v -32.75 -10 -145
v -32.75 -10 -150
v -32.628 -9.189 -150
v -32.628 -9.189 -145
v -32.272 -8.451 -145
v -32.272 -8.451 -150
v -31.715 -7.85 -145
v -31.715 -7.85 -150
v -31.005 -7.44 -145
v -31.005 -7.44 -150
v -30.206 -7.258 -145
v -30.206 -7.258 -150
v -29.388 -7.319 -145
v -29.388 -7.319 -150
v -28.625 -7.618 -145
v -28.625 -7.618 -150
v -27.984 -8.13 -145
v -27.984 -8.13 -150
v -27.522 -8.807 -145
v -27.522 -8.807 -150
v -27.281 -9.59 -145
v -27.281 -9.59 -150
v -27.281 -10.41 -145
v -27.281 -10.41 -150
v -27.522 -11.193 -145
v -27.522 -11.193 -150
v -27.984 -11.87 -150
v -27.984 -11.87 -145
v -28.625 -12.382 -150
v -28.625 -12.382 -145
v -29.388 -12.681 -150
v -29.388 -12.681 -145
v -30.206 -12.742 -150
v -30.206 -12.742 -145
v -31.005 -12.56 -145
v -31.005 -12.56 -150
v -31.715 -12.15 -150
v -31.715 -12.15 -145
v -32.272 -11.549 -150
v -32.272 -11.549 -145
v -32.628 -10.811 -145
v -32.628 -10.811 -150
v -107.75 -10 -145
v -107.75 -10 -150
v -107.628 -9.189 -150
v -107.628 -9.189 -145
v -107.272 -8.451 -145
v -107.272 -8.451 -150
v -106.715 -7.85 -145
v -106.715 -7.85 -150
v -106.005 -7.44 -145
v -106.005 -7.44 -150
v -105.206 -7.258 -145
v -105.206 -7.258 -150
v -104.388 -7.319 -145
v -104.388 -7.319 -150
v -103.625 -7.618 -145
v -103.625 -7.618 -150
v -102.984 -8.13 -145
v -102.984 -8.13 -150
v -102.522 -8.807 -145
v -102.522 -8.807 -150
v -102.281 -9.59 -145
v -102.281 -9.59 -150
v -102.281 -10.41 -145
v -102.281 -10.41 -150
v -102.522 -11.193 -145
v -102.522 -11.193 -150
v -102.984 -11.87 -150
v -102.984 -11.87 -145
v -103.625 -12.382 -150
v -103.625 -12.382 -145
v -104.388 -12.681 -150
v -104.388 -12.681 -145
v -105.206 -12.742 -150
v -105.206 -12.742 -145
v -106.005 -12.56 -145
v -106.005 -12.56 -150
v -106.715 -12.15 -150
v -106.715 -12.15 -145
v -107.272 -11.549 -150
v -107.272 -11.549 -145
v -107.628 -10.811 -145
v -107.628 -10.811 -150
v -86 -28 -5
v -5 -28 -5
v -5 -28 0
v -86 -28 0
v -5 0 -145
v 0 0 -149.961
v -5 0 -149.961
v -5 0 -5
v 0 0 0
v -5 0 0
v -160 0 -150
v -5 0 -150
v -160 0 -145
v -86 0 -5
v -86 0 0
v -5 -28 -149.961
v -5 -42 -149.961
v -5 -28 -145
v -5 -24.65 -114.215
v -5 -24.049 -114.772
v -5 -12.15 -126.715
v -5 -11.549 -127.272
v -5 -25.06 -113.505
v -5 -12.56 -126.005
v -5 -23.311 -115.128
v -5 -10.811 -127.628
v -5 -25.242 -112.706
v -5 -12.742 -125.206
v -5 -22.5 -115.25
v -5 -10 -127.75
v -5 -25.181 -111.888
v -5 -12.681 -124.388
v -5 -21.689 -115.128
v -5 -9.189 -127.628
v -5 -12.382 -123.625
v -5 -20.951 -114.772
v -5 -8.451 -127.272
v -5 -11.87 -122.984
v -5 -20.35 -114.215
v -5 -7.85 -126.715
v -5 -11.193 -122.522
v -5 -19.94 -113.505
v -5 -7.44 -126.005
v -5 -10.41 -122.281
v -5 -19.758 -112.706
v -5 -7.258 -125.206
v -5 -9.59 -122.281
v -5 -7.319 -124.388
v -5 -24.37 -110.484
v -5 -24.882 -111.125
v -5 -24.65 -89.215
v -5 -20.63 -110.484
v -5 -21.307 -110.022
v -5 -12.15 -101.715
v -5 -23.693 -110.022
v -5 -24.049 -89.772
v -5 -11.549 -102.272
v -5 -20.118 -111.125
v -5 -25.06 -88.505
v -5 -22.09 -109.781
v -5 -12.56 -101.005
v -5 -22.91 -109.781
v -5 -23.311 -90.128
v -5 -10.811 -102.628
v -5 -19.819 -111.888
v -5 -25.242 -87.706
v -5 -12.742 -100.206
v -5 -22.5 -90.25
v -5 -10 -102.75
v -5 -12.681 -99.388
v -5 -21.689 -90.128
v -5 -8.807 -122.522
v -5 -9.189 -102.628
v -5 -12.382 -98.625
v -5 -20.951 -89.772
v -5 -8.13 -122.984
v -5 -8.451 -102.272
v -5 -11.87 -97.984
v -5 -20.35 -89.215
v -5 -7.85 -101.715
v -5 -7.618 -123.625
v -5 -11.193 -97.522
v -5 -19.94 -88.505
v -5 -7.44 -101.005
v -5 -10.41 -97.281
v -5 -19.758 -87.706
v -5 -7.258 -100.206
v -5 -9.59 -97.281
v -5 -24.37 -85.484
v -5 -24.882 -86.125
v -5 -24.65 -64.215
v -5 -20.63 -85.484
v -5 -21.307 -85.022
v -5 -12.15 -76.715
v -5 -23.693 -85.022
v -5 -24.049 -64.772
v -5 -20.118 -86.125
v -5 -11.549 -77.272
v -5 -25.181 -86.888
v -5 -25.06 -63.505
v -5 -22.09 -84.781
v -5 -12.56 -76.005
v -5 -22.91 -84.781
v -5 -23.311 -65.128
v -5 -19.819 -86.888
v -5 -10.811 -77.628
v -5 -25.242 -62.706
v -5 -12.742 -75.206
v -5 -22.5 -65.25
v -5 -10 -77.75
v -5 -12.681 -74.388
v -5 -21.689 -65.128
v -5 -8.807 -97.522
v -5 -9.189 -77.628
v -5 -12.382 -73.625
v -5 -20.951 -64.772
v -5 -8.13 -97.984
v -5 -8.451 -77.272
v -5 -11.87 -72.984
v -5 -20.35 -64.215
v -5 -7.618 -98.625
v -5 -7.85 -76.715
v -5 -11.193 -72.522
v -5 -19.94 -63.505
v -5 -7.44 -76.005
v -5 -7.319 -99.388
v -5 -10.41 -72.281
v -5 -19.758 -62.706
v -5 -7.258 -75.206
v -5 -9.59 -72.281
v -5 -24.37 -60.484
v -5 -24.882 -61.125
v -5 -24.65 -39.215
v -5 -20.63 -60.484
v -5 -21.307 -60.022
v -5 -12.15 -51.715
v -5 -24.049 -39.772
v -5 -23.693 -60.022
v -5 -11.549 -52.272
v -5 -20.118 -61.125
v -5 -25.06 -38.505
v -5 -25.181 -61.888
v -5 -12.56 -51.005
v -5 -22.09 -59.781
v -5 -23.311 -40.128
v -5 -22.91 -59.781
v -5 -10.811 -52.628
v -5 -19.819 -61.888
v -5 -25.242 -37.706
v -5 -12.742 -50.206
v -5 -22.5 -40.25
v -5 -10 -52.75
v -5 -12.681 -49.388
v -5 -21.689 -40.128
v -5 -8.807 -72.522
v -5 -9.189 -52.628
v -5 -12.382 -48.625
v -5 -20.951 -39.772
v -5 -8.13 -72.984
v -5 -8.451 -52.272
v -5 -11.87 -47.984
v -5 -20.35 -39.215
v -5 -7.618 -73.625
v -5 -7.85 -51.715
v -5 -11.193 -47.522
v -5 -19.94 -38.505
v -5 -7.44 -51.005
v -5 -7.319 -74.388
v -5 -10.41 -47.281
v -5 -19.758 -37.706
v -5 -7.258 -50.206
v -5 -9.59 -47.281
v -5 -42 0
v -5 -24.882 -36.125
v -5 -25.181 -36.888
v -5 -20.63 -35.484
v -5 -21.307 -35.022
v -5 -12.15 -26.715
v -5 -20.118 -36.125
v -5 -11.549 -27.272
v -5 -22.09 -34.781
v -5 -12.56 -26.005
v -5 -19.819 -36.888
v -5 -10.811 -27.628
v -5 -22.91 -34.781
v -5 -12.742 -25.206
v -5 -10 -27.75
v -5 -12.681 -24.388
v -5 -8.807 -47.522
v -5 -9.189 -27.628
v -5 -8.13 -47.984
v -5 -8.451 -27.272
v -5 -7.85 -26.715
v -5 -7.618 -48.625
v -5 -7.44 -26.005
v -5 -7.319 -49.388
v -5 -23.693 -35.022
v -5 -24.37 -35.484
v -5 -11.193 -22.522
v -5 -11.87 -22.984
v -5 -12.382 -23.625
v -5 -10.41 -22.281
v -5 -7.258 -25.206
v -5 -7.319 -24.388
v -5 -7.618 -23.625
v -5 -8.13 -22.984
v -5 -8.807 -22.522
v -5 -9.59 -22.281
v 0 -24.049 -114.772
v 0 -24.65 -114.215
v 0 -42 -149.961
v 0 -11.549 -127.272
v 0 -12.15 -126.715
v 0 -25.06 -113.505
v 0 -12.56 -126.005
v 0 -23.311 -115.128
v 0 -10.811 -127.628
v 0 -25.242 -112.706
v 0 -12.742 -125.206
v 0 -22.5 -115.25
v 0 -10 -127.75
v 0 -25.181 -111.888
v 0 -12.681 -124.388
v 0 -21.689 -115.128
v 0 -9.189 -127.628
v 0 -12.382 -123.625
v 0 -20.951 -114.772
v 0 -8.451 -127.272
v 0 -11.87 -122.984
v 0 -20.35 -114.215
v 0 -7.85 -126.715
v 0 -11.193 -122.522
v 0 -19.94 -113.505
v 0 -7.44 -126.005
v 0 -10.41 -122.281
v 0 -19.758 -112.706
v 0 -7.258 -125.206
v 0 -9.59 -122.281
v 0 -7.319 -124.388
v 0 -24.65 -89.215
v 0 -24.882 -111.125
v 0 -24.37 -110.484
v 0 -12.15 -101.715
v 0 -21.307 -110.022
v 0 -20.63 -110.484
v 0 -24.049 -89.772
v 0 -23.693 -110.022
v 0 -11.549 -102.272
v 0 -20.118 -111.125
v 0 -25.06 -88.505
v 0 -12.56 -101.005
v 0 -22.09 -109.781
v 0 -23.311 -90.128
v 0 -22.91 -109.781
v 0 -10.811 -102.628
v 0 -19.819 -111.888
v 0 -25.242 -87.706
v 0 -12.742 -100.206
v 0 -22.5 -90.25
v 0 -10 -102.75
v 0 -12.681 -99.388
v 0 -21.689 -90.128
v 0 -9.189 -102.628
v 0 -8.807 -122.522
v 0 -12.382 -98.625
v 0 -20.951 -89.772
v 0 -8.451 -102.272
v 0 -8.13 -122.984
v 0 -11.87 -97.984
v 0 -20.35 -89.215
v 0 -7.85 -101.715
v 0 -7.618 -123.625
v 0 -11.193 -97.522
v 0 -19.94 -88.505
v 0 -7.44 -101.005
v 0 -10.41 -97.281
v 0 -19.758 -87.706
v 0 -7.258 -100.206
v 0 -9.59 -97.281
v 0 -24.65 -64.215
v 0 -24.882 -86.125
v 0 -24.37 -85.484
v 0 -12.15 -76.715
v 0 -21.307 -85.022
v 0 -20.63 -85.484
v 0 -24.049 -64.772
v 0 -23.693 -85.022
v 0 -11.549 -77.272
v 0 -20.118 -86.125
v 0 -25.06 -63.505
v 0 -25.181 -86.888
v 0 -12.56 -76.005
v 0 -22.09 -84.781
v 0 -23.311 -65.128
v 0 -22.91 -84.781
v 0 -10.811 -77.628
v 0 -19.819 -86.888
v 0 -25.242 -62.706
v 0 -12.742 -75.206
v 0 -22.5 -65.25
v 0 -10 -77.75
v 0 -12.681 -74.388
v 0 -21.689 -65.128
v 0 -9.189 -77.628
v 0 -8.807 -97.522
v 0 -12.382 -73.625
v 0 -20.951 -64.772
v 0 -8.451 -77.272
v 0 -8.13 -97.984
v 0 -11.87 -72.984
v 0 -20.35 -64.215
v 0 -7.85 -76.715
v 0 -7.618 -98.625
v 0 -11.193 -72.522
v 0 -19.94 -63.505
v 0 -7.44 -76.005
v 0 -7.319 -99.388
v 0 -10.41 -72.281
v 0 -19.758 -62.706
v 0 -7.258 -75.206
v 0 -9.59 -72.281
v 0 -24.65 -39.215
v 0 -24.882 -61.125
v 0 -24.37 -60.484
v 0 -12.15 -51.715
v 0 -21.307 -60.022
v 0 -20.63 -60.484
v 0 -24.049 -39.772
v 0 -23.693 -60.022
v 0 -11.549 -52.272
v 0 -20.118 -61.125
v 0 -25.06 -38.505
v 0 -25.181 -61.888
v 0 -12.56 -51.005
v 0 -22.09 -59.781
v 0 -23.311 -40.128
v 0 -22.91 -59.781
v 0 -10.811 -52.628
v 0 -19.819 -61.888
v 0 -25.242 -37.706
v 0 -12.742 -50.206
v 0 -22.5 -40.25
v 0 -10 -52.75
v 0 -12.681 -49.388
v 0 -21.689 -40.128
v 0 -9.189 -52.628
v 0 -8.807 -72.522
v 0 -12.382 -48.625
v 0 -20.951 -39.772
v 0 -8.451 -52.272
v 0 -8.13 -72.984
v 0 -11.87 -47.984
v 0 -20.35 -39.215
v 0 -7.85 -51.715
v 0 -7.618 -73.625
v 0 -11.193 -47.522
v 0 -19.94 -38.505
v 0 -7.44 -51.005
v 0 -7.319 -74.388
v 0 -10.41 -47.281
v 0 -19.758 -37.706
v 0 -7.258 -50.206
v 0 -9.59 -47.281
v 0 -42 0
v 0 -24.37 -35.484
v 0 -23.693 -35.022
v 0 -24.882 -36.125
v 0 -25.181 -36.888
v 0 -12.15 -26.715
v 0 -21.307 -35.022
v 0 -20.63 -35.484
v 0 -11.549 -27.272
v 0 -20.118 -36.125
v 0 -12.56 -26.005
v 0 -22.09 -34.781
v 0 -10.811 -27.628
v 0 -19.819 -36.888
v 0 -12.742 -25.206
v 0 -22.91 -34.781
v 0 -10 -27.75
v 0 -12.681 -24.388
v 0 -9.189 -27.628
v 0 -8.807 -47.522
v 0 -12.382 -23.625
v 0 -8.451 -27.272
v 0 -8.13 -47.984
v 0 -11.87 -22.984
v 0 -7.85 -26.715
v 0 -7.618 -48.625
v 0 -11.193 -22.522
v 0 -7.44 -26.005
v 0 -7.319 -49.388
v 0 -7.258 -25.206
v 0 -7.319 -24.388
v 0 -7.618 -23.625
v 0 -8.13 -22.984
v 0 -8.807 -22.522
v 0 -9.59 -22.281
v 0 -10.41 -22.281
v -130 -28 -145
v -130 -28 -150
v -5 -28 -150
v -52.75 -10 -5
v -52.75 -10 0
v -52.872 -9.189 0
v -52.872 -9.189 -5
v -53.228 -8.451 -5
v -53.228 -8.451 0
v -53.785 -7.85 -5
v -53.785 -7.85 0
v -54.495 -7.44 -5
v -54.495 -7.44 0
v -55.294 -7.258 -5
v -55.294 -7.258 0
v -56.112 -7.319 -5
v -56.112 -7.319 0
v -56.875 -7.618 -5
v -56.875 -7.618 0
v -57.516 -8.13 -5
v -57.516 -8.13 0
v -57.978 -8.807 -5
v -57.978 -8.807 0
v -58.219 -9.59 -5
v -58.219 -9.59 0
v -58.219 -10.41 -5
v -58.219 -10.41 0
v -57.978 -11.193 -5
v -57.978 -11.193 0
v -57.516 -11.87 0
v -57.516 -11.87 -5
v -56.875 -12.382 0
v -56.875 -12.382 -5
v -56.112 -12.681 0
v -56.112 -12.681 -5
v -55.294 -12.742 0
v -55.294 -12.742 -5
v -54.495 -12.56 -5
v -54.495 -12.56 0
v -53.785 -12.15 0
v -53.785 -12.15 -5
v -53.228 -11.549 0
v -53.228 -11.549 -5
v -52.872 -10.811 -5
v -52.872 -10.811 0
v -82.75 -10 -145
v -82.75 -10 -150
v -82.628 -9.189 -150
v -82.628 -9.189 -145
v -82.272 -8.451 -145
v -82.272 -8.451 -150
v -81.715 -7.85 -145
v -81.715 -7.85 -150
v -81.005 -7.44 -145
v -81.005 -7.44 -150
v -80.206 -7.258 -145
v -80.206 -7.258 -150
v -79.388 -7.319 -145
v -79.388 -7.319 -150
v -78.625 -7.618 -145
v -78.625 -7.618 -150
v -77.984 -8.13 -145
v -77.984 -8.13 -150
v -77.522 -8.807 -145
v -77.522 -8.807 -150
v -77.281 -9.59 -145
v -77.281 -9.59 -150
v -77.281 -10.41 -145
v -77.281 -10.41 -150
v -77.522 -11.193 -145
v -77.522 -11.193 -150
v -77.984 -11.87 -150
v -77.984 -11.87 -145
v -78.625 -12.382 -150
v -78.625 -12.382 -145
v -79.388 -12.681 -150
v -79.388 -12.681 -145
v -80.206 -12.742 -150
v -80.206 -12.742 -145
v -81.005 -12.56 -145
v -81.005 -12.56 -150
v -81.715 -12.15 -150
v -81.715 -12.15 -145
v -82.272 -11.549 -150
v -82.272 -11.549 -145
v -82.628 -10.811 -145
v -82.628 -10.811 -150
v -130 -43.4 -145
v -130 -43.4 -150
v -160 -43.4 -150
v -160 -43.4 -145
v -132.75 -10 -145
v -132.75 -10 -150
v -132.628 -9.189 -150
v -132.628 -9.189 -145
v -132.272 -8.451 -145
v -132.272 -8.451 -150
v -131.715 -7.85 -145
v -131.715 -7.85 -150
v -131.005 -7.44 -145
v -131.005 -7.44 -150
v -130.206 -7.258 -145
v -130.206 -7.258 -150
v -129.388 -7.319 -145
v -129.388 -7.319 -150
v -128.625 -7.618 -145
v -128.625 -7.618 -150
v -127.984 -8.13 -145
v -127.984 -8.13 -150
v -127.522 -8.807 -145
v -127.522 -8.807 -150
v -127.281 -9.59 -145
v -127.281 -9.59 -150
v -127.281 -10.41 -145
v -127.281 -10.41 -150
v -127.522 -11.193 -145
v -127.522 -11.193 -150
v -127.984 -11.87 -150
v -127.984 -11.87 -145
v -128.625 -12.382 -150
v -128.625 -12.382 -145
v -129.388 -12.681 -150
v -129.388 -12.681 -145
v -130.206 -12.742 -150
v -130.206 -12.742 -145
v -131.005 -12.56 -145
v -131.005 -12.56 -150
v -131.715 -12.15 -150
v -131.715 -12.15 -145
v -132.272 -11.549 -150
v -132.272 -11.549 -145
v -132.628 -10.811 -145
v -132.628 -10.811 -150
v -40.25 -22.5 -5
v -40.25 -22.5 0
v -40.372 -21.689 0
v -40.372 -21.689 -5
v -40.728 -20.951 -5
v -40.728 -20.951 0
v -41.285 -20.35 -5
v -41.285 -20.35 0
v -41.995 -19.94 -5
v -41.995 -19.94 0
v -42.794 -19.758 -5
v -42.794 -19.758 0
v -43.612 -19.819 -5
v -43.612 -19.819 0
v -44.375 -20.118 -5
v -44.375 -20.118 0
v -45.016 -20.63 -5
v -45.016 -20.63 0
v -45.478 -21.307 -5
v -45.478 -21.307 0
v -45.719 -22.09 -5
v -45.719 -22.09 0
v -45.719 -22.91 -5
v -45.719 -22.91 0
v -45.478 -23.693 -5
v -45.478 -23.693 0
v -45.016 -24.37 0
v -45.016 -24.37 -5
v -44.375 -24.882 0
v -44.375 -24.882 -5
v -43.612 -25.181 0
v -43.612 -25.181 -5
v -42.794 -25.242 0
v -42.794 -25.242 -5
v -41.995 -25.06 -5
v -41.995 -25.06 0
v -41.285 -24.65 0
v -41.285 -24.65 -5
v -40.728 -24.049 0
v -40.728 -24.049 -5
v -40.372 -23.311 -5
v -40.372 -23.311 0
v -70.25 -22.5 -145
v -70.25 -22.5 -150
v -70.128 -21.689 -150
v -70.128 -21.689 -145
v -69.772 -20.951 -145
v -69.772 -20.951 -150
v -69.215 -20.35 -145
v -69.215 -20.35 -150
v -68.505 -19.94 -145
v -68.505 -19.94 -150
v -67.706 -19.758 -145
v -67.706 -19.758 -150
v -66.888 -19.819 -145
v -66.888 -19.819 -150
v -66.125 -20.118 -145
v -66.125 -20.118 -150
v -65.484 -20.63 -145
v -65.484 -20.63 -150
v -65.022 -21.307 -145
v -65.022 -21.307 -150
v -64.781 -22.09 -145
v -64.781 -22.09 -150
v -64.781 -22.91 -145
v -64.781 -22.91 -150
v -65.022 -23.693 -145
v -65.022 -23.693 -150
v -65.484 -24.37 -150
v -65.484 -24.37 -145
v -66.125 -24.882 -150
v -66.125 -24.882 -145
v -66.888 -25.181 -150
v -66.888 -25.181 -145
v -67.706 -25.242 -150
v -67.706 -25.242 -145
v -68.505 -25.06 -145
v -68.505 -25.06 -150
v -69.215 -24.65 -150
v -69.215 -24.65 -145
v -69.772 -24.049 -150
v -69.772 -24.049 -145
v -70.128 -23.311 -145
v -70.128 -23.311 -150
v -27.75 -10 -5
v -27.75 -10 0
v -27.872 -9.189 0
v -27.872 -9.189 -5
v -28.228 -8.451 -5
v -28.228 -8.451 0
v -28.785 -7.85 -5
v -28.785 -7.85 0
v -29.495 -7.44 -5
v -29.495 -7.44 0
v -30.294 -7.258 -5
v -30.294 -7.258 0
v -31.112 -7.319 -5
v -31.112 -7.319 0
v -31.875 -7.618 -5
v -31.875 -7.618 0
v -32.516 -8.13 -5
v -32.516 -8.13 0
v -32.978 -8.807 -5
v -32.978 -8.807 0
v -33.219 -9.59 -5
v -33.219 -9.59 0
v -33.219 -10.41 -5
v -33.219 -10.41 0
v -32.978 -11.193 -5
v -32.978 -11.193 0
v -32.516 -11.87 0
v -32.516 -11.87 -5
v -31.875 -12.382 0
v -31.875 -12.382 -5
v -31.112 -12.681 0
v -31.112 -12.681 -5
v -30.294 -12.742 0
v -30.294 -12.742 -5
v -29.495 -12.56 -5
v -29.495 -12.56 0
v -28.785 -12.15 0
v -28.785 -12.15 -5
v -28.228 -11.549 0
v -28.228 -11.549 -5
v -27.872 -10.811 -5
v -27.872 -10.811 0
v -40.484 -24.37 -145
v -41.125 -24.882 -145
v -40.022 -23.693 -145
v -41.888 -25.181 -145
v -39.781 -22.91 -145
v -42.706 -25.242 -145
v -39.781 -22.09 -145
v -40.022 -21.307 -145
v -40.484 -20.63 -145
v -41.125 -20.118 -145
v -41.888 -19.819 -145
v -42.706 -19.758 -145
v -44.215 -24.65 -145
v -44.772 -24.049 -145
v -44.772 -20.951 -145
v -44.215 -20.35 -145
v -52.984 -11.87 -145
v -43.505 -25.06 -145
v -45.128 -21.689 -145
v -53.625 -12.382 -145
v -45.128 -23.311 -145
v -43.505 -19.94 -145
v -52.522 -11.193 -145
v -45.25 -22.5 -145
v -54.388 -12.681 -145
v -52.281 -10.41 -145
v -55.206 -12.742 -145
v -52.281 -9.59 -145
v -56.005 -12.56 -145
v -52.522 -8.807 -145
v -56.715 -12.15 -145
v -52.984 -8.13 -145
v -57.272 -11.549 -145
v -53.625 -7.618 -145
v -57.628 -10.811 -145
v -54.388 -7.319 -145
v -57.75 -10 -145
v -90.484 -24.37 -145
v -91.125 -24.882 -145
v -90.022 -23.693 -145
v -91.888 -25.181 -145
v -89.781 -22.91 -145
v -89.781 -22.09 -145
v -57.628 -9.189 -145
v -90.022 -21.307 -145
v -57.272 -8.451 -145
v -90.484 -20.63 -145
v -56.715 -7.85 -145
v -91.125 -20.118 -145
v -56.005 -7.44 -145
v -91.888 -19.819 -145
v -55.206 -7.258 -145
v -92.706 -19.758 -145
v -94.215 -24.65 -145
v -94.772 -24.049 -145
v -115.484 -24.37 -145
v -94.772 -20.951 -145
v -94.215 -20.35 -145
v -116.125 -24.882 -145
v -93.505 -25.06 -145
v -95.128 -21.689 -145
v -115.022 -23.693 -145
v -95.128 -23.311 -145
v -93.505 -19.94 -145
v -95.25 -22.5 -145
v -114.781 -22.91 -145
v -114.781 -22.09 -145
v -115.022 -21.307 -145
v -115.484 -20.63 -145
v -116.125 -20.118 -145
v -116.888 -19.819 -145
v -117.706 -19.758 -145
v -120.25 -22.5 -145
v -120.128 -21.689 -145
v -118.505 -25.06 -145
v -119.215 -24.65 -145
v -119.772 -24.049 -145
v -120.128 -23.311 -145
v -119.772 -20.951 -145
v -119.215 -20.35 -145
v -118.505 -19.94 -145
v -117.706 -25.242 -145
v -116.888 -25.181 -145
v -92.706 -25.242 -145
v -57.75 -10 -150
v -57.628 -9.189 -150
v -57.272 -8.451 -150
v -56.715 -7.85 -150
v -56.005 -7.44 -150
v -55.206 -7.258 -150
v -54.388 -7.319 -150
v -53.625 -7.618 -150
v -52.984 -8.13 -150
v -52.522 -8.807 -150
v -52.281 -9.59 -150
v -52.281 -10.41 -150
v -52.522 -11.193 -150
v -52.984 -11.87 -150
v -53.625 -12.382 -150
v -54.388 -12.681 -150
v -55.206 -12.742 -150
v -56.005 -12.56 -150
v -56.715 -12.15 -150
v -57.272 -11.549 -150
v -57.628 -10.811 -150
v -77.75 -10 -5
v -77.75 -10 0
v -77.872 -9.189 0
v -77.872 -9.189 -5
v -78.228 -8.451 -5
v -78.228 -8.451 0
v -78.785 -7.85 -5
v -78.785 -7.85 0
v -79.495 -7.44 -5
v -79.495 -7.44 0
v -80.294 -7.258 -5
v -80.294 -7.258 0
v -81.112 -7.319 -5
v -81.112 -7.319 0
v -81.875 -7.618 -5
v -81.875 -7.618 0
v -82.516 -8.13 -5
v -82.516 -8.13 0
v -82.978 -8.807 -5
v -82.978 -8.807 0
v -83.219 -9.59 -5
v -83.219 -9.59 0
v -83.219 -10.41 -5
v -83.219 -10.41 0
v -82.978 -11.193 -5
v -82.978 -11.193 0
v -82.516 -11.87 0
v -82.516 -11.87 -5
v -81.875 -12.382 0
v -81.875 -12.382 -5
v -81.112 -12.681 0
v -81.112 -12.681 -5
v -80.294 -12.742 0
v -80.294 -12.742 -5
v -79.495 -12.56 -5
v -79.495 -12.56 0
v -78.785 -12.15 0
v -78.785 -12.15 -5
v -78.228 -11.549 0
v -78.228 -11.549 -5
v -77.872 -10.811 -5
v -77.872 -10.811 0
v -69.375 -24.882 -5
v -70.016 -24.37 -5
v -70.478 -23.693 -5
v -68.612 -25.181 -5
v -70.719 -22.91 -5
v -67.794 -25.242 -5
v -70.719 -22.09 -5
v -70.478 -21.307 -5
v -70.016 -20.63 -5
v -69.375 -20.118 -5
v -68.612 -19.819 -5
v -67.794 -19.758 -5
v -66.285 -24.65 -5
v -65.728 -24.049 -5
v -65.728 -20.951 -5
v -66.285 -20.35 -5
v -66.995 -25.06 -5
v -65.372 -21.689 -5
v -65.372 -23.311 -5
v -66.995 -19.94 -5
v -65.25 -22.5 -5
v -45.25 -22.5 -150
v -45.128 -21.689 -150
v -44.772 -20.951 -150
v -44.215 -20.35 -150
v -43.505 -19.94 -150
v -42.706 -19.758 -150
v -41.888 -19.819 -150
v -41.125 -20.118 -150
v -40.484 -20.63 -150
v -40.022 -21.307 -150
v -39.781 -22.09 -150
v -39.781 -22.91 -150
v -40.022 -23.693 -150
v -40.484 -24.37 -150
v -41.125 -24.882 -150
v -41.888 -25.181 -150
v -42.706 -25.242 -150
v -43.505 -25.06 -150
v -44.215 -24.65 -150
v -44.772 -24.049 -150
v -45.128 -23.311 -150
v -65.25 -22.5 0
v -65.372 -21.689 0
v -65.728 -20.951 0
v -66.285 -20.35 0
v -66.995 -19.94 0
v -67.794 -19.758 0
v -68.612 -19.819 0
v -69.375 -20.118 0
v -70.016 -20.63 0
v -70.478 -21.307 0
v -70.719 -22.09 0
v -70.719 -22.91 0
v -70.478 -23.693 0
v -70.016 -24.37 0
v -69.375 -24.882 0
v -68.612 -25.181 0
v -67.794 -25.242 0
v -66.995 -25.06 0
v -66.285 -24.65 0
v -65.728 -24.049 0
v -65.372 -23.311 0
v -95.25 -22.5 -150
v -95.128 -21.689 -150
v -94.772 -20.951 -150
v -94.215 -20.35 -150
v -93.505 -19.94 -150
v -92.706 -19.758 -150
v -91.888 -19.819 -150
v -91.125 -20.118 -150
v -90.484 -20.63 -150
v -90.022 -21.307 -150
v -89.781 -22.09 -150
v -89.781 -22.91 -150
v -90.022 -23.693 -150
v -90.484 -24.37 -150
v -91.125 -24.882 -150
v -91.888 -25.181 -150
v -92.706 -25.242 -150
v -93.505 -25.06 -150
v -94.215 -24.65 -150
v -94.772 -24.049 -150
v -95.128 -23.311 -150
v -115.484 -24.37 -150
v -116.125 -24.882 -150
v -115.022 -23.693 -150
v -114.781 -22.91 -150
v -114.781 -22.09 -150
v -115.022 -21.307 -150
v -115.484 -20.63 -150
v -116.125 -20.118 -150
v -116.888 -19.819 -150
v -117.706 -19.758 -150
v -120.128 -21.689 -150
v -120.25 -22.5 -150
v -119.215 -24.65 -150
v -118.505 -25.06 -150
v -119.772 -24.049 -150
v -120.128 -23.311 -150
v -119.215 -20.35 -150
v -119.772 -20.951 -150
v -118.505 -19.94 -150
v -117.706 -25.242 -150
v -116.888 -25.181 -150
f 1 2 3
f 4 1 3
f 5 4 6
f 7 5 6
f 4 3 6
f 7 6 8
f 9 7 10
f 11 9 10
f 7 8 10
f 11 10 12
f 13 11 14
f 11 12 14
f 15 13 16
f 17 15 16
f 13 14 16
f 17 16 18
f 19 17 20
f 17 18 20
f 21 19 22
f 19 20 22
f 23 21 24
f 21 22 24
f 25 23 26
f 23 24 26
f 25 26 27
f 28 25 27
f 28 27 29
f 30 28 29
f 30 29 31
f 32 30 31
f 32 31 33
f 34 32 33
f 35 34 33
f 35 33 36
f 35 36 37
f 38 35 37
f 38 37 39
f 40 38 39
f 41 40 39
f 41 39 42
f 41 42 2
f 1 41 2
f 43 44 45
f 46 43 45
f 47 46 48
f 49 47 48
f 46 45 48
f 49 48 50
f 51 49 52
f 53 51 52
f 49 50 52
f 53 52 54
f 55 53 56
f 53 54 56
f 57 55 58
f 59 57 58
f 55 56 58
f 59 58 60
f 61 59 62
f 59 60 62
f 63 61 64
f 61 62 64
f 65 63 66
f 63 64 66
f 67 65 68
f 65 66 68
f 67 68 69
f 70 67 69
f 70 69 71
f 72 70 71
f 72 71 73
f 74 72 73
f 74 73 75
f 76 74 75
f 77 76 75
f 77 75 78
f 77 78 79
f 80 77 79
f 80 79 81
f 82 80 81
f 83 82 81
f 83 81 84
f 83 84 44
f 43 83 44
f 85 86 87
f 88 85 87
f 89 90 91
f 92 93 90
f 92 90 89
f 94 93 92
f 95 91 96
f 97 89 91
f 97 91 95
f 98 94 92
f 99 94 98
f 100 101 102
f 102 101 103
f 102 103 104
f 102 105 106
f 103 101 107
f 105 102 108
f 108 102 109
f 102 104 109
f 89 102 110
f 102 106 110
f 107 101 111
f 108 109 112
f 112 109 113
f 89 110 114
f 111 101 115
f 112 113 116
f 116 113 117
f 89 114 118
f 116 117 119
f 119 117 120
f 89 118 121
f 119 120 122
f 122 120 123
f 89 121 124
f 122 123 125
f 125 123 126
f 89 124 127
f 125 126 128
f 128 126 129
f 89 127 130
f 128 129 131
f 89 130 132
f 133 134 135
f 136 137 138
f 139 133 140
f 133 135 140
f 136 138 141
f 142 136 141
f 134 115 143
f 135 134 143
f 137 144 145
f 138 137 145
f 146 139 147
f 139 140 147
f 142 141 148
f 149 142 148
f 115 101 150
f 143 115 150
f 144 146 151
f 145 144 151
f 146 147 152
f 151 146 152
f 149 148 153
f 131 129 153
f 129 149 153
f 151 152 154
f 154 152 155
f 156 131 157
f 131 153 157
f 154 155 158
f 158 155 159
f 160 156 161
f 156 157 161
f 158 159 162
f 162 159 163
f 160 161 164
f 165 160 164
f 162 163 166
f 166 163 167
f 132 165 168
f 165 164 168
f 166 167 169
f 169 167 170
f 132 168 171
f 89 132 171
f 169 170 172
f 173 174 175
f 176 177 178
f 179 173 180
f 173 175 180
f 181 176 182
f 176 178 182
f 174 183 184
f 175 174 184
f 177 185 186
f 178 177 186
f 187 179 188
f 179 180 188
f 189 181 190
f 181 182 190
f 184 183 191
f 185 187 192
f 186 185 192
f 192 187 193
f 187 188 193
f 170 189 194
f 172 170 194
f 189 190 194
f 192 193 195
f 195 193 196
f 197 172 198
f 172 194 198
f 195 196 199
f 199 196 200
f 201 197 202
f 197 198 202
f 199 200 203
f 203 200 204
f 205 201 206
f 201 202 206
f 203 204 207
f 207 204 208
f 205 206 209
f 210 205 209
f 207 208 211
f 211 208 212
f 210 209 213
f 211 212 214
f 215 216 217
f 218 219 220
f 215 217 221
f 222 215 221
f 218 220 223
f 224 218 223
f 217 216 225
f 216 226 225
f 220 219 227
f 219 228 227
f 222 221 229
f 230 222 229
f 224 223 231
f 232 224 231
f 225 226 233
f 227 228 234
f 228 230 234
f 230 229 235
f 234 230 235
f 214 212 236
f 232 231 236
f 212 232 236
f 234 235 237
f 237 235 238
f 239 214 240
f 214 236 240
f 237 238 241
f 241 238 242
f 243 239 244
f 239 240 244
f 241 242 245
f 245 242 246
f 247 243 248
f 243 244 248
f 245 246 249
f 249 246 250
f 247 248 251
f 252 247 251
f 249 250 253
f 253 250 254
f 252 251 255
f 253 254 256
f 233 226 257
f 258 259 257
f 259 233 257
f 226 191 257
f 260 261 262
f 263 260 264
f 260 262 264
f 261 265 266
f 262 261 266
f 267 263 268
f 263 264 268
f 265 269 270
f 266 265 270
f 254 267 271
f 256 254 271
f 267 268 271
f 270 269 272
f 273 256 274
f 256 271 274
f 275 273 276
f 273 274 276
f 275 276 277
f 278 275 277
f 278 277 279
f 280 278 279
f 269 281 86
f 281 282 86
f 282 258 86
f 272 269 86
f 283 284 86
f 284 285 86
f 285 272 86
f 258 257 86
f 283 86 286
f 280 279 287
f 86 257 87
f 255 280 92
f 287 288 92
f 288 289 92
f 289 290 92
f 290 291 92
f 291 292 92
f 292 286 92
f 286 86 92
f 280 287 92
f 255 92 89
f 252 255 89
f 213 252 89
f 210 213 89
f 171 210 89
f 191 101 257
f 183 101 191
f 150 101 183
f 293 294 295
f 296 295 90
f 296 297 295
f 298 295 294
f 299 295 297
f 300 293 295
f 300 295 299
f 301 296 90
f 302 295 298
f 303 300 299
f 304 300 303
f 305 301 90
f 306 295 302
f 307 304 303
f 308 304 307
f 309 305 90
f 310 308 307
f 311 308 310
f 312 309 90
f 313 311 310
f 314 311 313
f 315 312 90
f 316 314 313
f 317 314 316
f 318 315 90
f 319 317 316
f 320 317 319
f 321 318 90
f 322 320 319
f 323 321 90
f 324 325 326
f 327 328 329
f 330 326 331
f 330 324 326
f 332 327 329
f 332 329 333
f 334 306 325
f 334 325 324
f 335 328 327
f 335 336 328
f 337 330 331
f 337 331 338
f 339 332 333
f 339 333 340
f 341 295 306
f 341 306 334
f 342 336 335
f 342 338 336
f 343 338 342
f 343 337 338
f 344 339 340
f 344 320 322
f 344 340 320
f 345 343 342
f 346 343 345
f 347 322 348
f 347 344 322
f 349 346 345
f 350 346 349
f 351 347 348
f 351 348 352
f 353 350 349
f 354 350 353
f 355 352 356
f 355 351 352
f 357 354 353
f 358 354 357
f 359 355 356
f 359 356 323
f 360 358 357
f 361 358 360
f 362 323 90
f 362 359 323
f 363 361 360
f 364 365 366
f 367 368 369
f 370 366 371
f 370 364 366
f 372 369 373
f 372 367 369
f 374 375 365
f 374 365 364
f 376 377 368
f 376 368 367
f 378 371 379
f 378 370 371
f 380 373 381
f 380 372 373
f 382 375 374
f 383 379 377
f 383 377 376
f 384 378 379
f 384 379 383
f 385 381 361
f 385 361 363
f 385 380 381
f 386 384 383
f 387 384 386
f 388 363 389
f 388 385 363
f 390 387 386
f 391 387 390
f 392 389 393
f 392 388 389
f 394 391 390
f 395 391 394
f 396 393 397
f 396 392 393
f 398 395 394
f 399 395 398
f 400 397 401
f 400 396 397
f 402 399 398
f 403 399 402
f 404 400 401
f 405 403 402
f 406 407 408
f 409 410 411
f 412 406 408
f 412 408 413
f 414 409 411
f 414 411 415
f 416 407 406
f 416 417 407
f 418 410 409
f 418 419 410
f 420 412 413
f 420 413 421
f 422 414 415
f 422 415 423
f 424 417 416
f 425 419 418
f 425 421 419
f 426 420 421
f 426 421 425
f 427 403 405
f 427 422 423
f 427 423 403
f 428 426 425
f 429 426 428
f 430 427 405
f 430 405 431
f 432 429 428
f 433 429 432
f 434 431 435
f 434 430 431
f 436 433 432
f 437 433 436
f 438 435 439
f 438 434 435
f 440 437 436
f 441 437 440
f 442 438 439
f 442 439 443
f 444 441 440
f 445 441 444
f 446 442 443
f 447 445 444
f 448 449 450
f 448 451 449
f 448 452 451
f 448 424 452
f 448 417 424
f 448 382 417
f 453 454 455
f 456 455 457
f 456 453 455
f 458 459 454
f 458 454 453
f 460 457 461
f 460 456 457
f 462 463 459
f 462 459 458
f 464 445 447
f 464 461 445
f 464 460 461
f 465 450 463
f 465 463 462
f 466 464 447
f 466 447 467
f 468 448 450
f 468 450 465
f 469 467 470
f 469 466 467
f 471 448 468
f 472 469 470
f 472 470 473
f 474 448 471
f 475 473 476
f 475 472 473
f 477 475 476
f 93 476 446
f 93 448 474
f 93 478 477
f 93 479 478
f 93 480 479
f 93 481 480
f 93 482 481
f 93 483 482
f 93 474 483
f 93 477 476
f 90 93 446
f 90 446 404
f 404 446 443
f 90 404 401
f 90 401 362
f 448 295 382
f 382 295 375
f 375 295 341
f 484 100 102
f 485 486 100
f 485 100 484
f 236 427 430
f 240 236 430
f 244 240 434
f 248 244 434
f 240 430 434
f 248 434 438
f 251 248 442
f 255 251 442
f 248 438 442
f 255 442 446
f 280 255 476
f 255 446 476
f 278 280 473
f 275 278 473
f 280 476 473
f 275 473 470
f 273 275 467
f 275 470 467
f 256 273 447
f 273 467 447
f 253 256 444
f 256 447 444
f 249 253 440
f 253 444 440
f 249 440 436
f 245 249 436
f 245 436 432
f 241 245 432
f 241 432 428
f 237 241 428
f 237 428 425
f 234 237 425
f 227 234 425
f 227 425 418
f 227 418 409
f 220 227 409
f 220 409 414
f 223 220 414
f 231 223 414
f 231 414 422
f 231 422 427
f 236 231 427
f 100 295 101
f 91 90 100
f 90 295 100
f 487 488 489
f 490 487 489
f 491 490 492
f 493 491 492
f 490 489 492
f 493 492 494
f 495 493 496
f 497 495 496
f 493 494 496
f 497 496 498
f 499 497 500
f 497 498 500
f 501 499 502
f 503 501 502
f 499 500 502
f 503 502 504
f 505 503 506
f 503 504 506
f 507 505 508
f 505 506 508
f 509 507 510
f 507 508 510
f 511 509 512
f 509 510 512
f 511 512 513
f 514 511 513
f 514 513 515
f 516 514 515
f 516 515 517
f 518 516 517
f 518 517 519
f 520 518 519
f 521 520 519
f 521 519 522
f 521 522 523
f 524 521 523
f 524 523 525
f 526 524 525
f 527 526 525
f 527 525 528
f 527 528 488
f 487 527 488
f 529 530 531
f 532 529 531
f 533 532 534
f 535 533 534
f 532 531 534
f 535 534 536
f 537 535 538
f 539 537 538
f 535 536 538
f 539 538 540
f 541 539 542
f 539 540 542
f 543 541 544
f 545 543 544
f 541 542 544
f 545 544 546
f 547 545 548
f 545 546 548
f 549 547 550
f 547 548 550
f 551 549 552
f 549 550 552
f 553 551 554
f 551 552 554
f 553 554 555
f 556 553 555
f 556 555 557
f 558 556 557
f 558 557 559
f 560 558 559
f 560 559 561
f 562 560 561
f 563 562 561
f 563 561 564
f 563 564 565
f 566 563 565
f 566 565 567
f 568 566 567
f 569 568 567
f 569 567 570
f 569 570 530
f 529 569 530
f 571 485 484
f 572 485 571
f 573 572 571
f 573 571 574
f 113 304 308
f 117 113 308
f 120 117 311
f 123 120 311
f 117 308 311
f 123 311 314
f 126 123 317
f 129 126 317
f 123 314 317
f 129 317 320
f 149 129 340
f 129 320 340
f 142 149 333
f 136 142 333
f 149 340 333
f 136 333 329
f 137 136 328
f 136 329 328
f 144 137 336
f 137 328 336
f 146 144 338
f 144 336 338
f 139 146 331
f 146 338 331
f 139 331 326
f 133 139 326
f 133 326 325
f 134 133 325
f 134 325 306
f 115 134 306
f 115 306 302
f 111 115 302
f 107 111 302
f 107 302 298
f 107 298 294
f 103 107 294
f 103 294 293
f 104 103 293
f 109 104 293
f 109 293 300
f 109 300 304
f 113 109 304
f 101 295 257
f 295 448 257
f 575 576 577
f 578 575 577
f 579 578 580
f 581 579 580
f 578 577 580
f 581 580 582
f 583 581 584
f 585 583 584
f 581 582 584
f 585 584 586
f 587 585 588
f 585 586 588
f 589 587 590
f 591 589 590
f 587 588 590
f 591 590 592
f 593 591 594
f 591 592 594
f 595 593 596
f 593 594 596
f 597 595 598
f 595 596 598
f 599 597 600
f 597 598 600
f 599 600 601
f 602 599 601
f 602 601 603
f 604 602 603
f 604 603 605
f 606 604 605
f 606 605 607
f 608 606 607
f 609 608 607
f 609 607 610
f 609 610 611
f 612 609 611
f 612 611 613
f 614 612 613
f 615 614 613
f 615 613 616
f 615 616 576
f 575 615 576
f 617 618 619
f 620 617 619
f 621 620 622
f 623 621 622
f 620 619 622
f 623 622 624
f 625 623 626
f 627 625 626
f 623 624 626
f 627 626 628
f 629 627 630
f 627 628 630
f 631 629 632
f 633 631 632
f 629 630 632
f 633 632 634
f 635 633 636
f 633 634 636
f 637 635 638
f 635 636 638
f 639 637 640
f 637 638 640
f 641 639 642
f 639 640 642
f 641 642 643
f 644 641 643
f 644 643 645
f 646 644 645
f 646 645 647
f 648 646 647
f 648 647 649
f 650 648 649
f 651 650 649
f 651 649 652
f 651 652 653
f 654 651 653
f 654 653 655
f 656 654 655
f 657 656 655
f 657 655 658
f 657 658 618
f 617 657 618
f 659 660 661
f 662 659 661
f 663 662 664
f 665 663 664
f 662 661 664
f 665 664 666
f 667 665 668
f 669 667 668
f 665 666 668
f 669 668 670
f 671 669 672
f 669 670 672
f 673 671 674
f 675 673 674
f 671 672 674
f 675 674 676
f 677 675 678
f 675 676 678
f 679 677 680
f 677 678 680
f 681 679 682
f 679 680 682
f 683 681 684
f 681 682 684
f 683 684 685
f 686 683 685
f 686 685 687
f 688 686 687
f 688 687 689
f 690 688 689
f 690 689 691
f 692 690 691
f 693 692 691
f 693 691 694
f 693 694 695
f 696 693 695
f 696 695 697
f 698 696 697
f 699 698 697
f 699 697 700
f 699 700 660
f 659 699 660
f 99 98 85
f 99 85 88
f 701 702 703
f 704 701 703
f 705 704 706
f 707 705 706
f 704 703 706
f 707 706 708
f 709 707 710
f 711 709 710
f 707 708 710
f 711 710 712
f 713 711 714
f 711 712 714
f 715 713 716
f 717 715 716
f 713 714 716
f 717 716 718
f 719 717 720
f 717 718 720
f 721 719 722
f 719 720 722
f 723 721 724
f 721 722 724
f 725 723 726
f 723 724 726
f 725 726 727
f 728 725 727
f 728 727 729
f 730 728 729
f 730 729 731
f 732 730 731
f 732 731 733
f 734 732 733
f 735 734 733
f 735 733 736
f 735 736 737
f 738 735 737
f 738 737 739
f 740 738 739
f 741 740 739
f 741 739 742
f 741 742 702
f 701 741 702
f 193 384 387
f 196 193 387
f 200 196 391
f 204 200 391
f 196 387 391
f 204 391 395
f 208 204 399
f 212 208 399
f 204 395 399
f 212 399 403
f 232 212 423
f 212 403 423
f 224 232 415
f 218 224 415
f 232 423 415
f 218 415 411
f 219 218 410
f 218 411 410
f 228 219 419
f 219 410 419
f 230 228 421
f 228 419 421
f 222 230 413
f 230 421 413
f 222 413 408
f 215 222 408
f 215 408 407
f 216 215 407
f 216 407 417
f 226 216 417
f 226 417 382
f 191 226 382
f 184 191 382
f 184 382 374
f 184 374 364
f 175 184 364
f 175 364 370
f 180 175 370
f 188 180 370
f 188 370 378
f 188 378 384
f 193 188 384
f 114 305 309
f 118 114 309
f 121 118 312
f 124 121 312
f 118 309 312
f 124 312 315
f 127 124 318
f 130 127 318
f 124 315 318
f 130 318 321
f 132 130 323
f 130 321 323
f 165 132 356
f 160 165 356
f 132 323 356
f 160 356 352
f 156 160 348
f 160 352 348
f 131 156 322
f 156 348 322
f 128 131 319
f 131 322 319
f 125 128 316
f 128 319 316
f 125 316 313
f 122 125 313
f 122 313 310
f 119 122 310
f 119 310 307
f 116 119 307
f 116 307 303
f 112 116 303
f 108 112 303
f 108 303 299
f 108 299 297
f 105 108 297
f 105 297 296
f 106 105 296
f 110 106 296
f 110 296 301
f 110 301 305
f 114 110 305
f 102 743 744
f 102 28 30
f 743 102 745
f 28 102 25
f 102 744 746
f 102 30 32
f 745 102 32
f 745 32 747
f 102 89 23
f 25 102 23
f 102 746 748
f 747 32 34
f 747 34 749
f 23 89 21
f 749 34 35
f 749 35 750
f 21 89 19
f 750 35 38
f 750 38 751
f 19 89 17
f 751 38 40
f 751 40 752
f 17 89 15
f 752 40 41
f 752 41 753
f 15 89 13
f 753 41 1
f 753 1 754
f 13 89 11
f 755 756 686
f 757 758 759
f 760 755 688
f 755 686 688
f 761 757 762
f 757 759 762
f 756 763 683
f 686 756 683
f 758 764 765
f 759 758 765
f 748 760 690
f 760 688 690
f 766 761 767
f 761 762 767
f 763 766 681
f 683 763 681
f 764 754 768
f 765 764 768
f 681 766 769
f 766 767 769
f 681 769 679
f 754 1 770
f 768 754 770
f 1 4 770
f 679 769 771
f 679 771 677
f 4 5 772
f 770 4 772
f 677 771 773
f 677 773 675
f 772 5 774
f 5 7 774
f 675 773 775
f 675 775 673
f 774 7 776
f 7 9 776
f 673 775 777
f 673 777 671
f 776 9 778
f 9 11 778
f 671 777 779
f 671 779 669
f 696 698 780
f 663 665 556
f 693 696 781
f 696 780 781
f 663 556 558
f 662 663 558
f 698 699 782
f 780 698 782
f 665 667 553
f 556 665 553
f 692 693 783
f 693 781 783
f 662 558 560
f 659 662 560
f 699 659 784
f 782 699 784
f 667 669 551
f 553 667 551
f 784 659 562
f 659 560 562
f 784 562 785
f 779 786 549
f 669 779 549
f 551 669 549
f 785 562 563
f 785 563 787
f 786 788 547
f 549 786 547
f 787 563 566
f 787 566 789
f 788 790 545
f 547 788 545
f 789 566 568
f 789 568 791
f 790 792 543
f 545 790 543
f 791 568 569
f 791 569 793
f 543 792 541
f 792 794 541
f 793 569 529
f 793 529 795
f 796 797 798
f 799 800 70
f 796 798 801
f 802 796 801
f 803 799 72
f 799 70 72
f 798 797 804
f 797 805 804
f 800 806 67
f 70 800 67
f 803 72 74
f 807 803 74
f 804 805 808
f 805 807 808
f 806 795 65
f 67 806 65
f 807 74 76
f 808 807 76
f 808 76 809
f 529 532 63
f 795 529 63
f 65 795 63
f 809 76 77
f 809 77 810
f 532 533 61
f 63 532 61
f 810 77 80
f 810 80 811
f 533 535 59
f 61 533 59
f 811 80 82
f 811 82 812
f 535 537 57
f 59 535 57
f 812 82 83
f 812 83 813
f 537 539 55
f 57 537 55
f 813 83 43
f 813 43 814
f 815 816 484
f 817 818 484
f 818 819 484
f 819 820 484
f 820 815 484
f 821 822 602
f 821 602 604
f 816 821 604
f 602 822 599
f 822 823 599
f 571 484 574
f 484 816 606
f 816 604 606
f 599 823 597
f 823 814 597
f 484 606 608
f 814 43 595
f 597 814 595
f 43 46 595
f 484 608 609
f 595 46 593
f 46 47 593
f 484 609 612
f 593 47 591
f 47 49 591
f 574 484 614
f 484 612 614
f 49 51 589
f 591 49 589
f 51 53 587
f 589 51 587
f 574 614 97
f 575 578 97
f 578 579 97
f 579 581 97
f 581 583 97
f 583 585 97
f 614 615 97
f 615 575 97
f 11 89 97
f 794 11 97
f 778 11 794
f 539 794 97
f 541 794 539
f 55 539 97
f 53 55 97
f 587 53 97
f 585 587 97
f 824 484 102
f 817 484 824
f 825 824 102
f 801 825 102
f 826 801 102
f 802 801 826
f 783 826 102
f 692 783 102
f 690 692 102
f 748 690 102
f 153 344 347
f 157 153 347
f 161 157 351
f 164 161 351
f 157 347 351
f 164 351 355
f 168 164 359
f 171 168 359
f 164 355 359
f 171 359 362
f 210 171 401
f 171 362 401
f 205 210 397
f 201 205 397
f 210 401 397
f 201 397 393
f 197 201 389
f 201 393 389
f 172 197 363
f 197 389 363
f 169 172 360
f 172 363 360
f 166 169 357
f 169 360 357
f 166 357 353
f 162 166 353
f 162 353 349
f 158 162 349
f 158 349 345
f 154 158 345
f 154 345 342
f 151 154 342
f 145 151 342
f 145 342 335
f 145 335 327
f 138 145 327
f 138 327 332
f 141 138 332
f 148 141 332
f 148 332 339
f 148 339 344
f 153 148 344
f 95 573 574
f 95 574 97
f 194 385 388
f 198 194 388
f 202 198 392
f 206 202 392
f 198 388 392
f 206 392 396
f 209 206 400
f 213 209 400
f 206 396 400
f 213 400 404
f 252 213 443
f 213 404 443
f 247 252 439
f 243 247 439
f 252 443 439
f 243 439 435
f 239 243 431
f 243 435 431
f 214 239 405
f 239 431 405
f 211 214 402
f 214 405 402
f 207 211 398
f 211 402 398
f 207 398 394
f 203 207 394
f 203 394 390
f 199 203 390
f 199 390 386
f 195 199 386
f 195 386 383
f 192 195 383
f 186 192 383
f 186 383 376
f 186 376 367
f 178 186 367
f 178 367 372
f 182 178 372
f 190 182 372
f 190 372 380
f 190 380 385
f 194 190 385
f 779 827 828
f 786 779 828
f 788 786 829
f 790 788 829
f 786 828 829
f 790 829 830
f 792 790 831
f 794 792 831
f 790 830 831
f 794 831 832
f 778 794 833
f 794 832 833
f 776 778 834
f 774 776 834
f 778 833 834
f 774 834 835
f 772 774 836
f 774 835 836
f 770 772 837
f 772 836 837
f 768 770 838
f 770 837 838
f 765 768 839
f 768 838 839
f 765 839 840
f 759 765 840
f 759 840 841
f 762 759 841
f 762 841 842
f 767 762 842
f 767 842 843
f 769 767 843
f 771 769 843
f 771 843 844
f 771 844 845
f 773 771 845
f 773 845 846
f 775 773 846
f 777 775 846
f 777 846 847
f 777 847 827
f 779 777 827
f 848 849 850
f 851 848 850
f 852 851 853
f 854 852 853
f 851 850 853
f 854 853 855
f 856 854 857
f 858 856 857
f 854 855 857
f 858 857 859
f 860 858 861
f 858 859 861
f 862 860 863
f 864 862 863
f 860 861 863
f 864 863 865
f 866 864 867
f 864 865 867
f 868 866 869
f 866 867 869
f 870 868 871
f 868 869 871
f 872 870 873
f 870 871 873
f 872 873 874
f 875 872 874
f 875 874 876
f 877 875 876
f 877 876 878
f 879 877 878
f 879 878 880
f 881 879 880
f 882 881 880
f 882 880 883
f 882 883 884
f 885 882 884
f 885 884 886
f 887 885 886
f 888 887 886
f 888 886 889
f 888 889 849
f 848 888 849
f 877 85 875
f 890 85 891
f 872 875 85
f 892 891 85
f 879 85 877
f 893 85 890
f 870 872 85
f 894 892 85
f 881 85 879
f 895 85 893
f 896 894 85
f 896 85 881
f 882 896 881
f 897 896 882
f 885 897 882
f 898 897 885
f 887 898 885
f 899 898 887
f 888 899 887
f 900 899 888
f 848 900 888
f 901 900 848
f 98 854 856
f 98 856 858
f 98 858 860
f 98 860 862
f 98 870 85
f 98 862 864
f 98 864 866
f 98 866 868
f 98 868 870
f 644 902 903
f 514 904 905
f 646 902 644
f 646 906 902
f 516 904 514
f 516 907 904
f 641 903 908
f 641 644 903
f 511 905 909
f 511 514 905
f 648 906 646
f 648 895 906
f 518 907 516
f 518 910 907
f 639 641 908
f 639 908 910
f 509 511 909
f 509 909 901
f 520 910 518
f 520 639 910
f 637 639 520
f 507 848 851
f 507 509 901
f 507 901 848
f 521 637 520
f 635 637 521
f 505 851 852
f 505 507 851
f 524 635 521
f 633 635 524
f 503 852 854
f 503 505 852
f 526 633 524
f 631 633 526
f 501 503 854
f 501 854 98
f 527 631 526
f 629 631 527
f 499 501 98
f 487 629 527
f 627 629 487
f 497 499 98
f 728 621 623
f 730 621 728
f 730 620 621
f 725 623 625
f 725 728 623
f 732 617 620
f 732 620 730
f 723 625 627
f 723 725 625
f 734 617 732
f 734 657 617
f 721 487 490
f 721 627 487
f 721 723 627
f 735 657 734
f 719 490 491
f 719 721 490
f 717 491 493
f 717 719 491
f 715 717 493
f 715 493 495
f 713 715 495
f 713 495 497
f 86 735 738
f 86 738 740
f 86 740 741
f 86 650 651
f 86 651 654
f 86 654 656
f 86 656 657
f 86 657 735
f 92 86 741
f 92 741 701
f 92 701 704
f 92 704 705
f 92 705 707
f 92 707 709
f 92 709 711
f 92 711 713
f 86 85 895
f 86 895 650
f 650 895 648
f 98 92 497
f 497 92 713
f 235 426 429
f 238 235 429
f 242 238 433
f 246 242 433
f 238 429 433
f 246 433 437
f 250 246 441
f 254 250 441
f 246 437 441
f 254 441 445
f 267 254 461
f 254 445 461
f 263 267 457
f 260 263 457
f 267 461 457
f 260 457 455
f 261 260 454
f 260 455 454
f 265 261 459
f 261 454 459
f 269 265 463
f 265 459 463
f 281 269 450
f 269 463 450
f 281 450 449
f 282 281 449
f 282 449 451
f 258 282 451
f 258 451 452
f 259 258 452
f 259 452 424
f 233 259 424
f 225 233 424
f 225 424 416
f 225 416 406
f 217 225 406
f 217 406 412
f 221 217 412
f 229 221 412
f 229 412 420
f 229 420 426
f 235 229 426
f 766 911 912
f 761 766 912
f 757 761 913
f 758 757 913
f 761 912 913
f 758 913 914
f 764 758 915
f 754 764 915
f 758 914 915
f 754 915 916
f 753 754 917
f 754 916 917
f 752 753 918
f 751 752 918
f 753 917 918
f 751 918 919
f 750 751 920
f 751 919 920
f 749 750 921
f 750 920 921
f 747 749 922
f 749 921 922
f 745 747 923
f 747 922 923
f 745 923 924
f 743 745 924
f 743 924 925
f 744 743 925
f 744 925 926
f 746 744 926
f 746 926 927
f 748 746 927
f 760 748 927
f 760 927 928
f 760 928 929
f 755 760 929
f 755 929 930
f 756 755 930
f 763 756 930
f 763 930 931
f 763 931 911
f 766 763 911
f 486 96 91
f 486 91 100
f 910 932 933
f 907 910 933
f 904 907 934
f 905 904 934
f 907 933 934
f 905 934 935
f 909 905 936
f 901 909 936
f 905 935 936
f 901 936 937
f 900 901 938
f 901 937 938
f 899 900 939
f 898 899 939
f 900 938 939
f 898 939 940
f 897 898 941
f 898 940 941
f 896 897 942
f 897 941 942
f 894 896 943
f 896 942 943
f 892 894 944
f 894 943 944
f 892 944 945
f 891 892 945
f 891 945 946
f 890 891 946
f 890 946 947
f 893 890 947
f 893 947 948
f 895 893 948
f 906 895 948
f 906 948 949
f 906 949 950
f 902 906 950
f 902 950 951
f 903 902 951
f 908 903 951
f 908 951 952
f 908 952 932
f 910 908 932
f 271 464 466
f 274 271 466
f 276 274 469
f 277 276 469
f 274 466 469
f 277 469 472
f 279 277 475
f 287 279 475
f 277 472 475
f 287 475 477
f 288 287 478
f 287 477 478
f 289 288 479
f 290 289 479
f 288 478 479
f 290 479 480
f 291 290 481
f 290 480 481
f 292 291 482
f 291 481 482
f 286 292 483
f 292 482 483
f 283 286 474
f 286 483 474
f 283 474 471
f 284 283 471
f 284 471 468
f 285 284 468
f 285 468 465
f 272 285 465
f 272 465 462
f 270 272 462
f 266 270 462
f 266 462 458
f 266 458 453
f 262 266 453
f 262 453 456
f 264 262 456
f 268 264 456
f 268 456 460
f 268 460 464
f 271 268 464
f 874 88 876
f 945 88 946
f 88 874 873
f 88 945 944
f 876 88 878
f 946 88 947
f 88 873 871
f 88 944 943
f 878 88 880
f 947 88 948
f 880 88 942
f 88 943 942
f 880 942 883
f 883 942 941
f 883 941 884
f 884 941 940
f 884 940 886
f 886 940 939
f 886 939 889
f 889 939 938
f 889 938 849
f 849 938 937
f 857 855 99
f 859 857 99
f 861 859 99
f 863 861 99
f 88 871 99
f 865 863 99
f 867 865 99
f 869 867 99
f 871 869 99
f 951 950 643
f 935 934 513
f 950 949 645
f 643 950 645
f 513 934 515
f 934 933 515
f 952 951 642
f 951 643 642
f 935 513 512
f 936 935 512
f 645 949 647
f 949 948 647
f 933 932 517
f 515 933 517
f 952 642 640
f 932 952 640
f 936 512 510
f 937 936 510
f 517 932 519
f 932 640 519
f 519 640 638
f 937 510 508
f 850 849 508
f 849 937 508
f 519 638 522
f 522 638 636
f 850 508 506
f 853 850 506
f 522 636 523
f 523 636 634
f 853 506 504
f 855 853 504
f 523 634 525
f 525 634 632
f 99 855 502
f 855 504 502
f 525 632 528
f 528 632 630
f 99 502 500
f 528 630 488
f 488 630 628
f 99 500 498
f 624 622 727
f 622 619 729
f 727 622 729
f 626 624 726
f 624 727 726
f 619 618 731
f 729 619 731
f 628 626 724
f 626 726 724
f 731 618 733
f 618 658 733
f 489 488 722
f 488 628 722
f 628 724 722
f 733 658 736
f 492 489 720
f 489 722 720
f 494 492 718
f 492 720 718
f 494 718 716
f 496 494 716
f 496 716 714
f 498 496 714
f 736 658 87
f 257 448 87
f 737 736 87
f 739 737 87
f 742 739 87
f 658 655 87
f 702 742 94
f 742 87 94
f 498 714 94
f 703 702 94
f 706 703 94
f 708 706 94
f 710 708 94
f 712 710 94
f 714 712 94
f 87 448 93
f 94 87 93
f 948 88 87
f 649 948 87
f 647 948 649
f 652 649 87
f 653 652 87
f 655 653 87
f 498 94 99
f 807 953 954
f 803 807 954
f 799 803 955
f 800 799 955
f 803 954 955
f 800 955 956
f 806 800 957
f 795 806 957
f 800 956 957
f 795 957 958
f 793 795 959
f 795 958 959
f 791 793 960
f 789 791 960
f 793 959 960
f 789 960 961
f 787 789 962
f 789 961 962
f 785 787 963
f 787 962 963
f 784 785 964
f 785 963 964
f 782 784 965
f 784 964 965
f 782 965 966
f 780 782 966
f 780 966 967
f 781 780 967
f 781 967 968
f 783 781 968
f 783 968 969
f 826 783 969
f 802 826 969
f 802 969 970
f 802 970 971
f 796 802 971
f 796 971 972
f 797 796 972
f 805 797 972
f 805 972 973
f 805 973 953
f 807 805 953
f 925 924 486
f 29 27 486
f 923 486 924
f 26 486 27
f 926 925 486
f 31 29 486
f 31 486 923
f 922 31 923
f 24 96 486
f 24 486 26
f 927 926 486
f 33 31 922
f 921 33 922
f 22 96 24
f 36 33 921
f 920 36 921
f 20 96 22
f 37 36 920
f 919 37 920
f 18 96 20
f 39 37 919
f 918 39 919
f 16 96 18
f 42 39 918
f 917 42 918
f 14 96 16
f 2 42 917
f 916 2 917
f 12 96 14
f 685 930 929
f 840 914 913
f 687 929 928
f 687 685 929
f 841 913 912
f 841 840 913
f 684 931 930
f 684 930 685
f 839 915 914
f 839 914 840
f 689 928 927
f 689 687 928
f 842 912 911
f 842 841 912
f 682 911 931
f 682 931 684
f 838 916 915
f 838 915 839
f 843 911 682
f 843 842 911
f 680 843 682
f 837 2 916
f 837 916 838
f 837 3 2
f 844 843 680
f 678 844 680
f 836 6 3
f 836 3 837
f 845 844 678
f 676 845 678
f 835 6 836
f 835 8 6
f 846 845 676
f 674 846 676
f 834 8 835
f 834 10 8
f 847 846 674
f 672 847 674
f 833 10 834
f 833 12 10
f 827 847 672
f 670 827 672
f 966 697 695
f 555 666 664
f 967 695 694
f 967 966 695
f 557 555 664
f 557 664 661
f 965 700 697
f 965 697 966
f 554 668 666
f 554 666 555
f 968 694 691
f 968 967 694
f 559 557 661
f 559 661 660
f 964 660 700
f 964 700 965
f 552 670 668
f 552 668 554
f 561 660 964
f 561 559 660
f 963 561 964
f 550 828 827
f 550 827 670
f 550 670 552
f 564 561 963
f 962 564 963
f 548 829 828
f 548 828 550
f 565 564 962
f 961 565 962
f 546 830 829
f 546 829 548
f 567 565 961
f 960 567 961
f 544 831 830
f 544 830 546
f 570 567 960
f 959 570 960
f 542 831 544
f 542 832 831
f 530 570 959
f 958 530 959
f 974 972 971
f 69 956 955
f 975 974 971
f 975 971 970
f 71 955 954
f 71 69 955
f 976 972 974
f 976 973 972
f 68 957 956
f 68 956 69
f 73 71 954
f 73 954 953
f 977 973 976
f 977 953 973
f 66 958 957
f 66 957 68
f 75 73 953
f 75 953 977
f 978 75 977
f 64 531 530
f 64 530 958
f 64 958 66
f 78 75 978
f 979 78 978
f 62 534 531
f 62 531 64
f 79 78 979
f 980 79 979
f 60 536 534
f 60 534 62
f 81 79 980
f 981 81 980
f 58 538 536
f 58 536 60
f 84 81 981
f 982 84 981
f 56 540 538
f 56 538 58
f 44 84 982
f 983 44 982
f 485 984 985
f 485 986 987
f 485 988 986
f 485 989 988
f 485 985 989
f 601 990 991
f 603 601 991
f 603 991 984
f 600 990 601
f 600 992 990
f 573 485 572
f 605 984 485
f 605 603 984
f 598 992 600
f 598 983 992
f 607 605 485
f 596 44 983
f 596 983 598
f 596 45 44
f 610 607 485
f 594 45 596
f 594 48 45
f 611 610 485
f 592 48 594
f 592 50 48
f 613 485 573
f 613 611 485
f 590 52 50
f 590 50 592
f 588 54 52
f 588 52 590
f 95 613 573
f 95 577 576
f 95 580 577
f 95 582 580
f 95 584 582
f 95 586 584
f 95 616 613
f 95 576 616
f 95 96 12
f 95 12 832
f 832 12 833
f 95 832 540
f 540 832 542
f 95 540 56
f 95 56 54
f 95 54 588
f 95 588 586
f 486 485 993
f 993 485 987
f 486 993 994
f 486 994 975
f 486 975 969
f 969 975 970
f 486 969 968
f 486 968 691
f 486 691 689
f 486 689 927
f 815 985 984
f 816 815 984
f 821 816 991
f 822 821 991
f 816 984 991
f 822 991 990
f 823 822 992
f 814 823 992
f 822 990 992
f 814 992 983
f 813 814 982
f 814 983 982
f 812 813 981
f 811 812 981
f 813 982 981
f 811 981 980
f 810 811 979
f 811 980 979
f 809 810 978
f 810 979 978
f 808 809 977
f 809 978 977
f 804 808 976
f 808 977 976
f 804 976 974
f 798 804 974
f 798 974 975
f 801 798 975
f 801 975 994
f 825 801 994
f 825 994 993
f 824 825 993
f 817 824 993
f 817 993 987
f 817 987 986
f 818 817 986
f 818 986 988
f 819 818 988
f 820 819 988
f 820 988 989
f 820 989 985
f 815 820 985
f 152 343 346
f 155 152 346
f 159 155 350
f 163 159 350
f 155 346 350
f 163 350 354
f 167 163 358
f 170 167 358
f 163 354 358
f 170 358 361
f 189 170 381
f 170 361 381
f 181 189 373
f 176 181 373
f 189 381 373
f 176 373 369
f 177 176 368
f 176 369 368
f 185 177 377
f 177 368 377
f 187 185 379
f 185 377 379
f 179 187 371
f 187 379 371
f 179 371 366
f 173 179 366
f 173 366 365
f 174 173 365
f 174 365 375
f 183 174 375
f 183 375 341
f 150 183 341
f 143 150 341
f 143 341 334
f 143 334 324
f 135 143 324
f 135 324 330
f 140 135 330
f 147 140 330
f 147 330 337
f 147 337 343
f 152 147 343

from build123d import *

# Parameters (mm, degrees)
SKETCH1_W                      = 42
SKETCH1_H                      = 145.161285219
BOSS_EXTRUDE1_DEPTH            = 5
BOSS_EXTRUDE2_DEPTH            = 5
SKETCH3_W                      = 5
SKETCH3_H                      = 27.999999523
BOSS_EXTRUDE3_DEPTH            = 81.000003815
F_5_5_5_5_DIAMETER_HOLE1_D     = 5.5
F_5_5_5_5_DIAMETER_HOLE2_D     = 5.5
F_5_5_5_5_DIAMETER_HOLE2_DEPTH = 5
F_5_5_5_5_DIAMETER_HOLE3_D     = 5.5
F_5_5_5_5_DIAMETER_HOLE3_DEPTH = 5
SKETCH10_W                     = 5
SKETCH10_H                     = 42
BOSS_EXTRUDE4_DEPTH            = 4.8


with BuildPart() as part:
    # Sketch1 → Boss-Extrude1 (new body)
    with BuildSketch(Plane(origin=(-5, 0, 0), x_dir=(0, -1, 0), z_dir=(-1, 0, 0))):
        with Locations((21, -72.58064261)):
            Rectangle(SKETCH1_W, SKETCH1_H)
    extrude(amount=-BOSS_EXTRUDE1_DEPTH)

    # Sketch2 → Boss-Extrude2 (add)
    with BuildSketch(Plane(origin=(0, 0, -150), x_dir=(-1, 0, 0), z_dir=(0, 0, -1))):
        Polygon((130, -43.400001526), (160, -43.400001526), (160, 0), (5, 0), (5, -27.999999523), (130, -27.999999523), align=None)
    extrude(amount=-BOSS_EXTRUDE2_DEPTH)

    # Sketch3 → Boss-Extrude3 (add)
    with BuildSketch(Plane.ZY.offset(5)):
        with Locations((-2.5, -13.999999762)):
            Rectangle(SKETCH3_W, SKETCH3_H)
    extrude(amount=BOSS_EXTRUDE3_DEPTH)

    # Ø5.5 (5.5) Diameter Hole1 (through all)
    with Locations(Plane.ZY.offset(5)):
        with Locations((-37.500000596, -22.500000199), (-25.000000199, -9.99999995), (-50.000000795, -9.99999995), (-62.500000795, -22.500000199), (-75.000000795, -9.99999995), (-87.500000795, -22.500000199), (-112.500000795, -22.500000199), (-100.000000795, -9.99999995), (-125.000000795, -9.99999995)):
            Hole(F_5_5_5_5_DIAMETER_HOLE1_D / 2)

    # Ø5.5 (5.5) Diameter Hole2
    with Locations(Plane.XY.offset(-145)):
        with Locations((-30.000000199, -9.99999995), (-42.500000397, -22.500000199), (-67.500000795, -22.500000199), (-55.000000795, -9.99999995), (-80.000001192, -9.99999995), (-92.500000795, -22.500000199), (-117.500000795, -22.500000199), (-105.000000795, -9.99999995), (-130.000003179, -9.99999995)):
            Hole(F_5_5_5_5_DIAMETER_HOLE2_D / 2, depth=F_5_5_5_5_DIAMETER_HOLE2_DEPTH)

    # Ø5.5 (5.5) Diameter Hole3
    with Locations(Plane(origin=(0, 0, -5), x_dir=(-1, 0, 0), z_dir=(0, 0, -1))):
        with Locations((80.50000151, -9.99999995), (68.000001113, -22.500000199), (43.000001113, -22.500000199), (55.500001113, -9.99999995), (30.500000119, -9.99999995)):
            Hole(F_5_5_5_5_DIAMETER_HOLE3_D / 2, depth=F_5_5_5_5_DIAMETER_HOLE3_DEPTH)

    # Sketch10 → Boss-Extrude4 (add)
    with BuildSketch(Plane(origin=(0, 0, -145.161285219), x_dir=(-1, 0, 0), z_dir=(0, 0, -1))):
        with Locations((2.5, -21)):
            Rectangle(SKETCH10_W, SKETCH10_H)
    extrude(amount=BOSS_EXTRUDE4_DEPTH)


solid = part.part
